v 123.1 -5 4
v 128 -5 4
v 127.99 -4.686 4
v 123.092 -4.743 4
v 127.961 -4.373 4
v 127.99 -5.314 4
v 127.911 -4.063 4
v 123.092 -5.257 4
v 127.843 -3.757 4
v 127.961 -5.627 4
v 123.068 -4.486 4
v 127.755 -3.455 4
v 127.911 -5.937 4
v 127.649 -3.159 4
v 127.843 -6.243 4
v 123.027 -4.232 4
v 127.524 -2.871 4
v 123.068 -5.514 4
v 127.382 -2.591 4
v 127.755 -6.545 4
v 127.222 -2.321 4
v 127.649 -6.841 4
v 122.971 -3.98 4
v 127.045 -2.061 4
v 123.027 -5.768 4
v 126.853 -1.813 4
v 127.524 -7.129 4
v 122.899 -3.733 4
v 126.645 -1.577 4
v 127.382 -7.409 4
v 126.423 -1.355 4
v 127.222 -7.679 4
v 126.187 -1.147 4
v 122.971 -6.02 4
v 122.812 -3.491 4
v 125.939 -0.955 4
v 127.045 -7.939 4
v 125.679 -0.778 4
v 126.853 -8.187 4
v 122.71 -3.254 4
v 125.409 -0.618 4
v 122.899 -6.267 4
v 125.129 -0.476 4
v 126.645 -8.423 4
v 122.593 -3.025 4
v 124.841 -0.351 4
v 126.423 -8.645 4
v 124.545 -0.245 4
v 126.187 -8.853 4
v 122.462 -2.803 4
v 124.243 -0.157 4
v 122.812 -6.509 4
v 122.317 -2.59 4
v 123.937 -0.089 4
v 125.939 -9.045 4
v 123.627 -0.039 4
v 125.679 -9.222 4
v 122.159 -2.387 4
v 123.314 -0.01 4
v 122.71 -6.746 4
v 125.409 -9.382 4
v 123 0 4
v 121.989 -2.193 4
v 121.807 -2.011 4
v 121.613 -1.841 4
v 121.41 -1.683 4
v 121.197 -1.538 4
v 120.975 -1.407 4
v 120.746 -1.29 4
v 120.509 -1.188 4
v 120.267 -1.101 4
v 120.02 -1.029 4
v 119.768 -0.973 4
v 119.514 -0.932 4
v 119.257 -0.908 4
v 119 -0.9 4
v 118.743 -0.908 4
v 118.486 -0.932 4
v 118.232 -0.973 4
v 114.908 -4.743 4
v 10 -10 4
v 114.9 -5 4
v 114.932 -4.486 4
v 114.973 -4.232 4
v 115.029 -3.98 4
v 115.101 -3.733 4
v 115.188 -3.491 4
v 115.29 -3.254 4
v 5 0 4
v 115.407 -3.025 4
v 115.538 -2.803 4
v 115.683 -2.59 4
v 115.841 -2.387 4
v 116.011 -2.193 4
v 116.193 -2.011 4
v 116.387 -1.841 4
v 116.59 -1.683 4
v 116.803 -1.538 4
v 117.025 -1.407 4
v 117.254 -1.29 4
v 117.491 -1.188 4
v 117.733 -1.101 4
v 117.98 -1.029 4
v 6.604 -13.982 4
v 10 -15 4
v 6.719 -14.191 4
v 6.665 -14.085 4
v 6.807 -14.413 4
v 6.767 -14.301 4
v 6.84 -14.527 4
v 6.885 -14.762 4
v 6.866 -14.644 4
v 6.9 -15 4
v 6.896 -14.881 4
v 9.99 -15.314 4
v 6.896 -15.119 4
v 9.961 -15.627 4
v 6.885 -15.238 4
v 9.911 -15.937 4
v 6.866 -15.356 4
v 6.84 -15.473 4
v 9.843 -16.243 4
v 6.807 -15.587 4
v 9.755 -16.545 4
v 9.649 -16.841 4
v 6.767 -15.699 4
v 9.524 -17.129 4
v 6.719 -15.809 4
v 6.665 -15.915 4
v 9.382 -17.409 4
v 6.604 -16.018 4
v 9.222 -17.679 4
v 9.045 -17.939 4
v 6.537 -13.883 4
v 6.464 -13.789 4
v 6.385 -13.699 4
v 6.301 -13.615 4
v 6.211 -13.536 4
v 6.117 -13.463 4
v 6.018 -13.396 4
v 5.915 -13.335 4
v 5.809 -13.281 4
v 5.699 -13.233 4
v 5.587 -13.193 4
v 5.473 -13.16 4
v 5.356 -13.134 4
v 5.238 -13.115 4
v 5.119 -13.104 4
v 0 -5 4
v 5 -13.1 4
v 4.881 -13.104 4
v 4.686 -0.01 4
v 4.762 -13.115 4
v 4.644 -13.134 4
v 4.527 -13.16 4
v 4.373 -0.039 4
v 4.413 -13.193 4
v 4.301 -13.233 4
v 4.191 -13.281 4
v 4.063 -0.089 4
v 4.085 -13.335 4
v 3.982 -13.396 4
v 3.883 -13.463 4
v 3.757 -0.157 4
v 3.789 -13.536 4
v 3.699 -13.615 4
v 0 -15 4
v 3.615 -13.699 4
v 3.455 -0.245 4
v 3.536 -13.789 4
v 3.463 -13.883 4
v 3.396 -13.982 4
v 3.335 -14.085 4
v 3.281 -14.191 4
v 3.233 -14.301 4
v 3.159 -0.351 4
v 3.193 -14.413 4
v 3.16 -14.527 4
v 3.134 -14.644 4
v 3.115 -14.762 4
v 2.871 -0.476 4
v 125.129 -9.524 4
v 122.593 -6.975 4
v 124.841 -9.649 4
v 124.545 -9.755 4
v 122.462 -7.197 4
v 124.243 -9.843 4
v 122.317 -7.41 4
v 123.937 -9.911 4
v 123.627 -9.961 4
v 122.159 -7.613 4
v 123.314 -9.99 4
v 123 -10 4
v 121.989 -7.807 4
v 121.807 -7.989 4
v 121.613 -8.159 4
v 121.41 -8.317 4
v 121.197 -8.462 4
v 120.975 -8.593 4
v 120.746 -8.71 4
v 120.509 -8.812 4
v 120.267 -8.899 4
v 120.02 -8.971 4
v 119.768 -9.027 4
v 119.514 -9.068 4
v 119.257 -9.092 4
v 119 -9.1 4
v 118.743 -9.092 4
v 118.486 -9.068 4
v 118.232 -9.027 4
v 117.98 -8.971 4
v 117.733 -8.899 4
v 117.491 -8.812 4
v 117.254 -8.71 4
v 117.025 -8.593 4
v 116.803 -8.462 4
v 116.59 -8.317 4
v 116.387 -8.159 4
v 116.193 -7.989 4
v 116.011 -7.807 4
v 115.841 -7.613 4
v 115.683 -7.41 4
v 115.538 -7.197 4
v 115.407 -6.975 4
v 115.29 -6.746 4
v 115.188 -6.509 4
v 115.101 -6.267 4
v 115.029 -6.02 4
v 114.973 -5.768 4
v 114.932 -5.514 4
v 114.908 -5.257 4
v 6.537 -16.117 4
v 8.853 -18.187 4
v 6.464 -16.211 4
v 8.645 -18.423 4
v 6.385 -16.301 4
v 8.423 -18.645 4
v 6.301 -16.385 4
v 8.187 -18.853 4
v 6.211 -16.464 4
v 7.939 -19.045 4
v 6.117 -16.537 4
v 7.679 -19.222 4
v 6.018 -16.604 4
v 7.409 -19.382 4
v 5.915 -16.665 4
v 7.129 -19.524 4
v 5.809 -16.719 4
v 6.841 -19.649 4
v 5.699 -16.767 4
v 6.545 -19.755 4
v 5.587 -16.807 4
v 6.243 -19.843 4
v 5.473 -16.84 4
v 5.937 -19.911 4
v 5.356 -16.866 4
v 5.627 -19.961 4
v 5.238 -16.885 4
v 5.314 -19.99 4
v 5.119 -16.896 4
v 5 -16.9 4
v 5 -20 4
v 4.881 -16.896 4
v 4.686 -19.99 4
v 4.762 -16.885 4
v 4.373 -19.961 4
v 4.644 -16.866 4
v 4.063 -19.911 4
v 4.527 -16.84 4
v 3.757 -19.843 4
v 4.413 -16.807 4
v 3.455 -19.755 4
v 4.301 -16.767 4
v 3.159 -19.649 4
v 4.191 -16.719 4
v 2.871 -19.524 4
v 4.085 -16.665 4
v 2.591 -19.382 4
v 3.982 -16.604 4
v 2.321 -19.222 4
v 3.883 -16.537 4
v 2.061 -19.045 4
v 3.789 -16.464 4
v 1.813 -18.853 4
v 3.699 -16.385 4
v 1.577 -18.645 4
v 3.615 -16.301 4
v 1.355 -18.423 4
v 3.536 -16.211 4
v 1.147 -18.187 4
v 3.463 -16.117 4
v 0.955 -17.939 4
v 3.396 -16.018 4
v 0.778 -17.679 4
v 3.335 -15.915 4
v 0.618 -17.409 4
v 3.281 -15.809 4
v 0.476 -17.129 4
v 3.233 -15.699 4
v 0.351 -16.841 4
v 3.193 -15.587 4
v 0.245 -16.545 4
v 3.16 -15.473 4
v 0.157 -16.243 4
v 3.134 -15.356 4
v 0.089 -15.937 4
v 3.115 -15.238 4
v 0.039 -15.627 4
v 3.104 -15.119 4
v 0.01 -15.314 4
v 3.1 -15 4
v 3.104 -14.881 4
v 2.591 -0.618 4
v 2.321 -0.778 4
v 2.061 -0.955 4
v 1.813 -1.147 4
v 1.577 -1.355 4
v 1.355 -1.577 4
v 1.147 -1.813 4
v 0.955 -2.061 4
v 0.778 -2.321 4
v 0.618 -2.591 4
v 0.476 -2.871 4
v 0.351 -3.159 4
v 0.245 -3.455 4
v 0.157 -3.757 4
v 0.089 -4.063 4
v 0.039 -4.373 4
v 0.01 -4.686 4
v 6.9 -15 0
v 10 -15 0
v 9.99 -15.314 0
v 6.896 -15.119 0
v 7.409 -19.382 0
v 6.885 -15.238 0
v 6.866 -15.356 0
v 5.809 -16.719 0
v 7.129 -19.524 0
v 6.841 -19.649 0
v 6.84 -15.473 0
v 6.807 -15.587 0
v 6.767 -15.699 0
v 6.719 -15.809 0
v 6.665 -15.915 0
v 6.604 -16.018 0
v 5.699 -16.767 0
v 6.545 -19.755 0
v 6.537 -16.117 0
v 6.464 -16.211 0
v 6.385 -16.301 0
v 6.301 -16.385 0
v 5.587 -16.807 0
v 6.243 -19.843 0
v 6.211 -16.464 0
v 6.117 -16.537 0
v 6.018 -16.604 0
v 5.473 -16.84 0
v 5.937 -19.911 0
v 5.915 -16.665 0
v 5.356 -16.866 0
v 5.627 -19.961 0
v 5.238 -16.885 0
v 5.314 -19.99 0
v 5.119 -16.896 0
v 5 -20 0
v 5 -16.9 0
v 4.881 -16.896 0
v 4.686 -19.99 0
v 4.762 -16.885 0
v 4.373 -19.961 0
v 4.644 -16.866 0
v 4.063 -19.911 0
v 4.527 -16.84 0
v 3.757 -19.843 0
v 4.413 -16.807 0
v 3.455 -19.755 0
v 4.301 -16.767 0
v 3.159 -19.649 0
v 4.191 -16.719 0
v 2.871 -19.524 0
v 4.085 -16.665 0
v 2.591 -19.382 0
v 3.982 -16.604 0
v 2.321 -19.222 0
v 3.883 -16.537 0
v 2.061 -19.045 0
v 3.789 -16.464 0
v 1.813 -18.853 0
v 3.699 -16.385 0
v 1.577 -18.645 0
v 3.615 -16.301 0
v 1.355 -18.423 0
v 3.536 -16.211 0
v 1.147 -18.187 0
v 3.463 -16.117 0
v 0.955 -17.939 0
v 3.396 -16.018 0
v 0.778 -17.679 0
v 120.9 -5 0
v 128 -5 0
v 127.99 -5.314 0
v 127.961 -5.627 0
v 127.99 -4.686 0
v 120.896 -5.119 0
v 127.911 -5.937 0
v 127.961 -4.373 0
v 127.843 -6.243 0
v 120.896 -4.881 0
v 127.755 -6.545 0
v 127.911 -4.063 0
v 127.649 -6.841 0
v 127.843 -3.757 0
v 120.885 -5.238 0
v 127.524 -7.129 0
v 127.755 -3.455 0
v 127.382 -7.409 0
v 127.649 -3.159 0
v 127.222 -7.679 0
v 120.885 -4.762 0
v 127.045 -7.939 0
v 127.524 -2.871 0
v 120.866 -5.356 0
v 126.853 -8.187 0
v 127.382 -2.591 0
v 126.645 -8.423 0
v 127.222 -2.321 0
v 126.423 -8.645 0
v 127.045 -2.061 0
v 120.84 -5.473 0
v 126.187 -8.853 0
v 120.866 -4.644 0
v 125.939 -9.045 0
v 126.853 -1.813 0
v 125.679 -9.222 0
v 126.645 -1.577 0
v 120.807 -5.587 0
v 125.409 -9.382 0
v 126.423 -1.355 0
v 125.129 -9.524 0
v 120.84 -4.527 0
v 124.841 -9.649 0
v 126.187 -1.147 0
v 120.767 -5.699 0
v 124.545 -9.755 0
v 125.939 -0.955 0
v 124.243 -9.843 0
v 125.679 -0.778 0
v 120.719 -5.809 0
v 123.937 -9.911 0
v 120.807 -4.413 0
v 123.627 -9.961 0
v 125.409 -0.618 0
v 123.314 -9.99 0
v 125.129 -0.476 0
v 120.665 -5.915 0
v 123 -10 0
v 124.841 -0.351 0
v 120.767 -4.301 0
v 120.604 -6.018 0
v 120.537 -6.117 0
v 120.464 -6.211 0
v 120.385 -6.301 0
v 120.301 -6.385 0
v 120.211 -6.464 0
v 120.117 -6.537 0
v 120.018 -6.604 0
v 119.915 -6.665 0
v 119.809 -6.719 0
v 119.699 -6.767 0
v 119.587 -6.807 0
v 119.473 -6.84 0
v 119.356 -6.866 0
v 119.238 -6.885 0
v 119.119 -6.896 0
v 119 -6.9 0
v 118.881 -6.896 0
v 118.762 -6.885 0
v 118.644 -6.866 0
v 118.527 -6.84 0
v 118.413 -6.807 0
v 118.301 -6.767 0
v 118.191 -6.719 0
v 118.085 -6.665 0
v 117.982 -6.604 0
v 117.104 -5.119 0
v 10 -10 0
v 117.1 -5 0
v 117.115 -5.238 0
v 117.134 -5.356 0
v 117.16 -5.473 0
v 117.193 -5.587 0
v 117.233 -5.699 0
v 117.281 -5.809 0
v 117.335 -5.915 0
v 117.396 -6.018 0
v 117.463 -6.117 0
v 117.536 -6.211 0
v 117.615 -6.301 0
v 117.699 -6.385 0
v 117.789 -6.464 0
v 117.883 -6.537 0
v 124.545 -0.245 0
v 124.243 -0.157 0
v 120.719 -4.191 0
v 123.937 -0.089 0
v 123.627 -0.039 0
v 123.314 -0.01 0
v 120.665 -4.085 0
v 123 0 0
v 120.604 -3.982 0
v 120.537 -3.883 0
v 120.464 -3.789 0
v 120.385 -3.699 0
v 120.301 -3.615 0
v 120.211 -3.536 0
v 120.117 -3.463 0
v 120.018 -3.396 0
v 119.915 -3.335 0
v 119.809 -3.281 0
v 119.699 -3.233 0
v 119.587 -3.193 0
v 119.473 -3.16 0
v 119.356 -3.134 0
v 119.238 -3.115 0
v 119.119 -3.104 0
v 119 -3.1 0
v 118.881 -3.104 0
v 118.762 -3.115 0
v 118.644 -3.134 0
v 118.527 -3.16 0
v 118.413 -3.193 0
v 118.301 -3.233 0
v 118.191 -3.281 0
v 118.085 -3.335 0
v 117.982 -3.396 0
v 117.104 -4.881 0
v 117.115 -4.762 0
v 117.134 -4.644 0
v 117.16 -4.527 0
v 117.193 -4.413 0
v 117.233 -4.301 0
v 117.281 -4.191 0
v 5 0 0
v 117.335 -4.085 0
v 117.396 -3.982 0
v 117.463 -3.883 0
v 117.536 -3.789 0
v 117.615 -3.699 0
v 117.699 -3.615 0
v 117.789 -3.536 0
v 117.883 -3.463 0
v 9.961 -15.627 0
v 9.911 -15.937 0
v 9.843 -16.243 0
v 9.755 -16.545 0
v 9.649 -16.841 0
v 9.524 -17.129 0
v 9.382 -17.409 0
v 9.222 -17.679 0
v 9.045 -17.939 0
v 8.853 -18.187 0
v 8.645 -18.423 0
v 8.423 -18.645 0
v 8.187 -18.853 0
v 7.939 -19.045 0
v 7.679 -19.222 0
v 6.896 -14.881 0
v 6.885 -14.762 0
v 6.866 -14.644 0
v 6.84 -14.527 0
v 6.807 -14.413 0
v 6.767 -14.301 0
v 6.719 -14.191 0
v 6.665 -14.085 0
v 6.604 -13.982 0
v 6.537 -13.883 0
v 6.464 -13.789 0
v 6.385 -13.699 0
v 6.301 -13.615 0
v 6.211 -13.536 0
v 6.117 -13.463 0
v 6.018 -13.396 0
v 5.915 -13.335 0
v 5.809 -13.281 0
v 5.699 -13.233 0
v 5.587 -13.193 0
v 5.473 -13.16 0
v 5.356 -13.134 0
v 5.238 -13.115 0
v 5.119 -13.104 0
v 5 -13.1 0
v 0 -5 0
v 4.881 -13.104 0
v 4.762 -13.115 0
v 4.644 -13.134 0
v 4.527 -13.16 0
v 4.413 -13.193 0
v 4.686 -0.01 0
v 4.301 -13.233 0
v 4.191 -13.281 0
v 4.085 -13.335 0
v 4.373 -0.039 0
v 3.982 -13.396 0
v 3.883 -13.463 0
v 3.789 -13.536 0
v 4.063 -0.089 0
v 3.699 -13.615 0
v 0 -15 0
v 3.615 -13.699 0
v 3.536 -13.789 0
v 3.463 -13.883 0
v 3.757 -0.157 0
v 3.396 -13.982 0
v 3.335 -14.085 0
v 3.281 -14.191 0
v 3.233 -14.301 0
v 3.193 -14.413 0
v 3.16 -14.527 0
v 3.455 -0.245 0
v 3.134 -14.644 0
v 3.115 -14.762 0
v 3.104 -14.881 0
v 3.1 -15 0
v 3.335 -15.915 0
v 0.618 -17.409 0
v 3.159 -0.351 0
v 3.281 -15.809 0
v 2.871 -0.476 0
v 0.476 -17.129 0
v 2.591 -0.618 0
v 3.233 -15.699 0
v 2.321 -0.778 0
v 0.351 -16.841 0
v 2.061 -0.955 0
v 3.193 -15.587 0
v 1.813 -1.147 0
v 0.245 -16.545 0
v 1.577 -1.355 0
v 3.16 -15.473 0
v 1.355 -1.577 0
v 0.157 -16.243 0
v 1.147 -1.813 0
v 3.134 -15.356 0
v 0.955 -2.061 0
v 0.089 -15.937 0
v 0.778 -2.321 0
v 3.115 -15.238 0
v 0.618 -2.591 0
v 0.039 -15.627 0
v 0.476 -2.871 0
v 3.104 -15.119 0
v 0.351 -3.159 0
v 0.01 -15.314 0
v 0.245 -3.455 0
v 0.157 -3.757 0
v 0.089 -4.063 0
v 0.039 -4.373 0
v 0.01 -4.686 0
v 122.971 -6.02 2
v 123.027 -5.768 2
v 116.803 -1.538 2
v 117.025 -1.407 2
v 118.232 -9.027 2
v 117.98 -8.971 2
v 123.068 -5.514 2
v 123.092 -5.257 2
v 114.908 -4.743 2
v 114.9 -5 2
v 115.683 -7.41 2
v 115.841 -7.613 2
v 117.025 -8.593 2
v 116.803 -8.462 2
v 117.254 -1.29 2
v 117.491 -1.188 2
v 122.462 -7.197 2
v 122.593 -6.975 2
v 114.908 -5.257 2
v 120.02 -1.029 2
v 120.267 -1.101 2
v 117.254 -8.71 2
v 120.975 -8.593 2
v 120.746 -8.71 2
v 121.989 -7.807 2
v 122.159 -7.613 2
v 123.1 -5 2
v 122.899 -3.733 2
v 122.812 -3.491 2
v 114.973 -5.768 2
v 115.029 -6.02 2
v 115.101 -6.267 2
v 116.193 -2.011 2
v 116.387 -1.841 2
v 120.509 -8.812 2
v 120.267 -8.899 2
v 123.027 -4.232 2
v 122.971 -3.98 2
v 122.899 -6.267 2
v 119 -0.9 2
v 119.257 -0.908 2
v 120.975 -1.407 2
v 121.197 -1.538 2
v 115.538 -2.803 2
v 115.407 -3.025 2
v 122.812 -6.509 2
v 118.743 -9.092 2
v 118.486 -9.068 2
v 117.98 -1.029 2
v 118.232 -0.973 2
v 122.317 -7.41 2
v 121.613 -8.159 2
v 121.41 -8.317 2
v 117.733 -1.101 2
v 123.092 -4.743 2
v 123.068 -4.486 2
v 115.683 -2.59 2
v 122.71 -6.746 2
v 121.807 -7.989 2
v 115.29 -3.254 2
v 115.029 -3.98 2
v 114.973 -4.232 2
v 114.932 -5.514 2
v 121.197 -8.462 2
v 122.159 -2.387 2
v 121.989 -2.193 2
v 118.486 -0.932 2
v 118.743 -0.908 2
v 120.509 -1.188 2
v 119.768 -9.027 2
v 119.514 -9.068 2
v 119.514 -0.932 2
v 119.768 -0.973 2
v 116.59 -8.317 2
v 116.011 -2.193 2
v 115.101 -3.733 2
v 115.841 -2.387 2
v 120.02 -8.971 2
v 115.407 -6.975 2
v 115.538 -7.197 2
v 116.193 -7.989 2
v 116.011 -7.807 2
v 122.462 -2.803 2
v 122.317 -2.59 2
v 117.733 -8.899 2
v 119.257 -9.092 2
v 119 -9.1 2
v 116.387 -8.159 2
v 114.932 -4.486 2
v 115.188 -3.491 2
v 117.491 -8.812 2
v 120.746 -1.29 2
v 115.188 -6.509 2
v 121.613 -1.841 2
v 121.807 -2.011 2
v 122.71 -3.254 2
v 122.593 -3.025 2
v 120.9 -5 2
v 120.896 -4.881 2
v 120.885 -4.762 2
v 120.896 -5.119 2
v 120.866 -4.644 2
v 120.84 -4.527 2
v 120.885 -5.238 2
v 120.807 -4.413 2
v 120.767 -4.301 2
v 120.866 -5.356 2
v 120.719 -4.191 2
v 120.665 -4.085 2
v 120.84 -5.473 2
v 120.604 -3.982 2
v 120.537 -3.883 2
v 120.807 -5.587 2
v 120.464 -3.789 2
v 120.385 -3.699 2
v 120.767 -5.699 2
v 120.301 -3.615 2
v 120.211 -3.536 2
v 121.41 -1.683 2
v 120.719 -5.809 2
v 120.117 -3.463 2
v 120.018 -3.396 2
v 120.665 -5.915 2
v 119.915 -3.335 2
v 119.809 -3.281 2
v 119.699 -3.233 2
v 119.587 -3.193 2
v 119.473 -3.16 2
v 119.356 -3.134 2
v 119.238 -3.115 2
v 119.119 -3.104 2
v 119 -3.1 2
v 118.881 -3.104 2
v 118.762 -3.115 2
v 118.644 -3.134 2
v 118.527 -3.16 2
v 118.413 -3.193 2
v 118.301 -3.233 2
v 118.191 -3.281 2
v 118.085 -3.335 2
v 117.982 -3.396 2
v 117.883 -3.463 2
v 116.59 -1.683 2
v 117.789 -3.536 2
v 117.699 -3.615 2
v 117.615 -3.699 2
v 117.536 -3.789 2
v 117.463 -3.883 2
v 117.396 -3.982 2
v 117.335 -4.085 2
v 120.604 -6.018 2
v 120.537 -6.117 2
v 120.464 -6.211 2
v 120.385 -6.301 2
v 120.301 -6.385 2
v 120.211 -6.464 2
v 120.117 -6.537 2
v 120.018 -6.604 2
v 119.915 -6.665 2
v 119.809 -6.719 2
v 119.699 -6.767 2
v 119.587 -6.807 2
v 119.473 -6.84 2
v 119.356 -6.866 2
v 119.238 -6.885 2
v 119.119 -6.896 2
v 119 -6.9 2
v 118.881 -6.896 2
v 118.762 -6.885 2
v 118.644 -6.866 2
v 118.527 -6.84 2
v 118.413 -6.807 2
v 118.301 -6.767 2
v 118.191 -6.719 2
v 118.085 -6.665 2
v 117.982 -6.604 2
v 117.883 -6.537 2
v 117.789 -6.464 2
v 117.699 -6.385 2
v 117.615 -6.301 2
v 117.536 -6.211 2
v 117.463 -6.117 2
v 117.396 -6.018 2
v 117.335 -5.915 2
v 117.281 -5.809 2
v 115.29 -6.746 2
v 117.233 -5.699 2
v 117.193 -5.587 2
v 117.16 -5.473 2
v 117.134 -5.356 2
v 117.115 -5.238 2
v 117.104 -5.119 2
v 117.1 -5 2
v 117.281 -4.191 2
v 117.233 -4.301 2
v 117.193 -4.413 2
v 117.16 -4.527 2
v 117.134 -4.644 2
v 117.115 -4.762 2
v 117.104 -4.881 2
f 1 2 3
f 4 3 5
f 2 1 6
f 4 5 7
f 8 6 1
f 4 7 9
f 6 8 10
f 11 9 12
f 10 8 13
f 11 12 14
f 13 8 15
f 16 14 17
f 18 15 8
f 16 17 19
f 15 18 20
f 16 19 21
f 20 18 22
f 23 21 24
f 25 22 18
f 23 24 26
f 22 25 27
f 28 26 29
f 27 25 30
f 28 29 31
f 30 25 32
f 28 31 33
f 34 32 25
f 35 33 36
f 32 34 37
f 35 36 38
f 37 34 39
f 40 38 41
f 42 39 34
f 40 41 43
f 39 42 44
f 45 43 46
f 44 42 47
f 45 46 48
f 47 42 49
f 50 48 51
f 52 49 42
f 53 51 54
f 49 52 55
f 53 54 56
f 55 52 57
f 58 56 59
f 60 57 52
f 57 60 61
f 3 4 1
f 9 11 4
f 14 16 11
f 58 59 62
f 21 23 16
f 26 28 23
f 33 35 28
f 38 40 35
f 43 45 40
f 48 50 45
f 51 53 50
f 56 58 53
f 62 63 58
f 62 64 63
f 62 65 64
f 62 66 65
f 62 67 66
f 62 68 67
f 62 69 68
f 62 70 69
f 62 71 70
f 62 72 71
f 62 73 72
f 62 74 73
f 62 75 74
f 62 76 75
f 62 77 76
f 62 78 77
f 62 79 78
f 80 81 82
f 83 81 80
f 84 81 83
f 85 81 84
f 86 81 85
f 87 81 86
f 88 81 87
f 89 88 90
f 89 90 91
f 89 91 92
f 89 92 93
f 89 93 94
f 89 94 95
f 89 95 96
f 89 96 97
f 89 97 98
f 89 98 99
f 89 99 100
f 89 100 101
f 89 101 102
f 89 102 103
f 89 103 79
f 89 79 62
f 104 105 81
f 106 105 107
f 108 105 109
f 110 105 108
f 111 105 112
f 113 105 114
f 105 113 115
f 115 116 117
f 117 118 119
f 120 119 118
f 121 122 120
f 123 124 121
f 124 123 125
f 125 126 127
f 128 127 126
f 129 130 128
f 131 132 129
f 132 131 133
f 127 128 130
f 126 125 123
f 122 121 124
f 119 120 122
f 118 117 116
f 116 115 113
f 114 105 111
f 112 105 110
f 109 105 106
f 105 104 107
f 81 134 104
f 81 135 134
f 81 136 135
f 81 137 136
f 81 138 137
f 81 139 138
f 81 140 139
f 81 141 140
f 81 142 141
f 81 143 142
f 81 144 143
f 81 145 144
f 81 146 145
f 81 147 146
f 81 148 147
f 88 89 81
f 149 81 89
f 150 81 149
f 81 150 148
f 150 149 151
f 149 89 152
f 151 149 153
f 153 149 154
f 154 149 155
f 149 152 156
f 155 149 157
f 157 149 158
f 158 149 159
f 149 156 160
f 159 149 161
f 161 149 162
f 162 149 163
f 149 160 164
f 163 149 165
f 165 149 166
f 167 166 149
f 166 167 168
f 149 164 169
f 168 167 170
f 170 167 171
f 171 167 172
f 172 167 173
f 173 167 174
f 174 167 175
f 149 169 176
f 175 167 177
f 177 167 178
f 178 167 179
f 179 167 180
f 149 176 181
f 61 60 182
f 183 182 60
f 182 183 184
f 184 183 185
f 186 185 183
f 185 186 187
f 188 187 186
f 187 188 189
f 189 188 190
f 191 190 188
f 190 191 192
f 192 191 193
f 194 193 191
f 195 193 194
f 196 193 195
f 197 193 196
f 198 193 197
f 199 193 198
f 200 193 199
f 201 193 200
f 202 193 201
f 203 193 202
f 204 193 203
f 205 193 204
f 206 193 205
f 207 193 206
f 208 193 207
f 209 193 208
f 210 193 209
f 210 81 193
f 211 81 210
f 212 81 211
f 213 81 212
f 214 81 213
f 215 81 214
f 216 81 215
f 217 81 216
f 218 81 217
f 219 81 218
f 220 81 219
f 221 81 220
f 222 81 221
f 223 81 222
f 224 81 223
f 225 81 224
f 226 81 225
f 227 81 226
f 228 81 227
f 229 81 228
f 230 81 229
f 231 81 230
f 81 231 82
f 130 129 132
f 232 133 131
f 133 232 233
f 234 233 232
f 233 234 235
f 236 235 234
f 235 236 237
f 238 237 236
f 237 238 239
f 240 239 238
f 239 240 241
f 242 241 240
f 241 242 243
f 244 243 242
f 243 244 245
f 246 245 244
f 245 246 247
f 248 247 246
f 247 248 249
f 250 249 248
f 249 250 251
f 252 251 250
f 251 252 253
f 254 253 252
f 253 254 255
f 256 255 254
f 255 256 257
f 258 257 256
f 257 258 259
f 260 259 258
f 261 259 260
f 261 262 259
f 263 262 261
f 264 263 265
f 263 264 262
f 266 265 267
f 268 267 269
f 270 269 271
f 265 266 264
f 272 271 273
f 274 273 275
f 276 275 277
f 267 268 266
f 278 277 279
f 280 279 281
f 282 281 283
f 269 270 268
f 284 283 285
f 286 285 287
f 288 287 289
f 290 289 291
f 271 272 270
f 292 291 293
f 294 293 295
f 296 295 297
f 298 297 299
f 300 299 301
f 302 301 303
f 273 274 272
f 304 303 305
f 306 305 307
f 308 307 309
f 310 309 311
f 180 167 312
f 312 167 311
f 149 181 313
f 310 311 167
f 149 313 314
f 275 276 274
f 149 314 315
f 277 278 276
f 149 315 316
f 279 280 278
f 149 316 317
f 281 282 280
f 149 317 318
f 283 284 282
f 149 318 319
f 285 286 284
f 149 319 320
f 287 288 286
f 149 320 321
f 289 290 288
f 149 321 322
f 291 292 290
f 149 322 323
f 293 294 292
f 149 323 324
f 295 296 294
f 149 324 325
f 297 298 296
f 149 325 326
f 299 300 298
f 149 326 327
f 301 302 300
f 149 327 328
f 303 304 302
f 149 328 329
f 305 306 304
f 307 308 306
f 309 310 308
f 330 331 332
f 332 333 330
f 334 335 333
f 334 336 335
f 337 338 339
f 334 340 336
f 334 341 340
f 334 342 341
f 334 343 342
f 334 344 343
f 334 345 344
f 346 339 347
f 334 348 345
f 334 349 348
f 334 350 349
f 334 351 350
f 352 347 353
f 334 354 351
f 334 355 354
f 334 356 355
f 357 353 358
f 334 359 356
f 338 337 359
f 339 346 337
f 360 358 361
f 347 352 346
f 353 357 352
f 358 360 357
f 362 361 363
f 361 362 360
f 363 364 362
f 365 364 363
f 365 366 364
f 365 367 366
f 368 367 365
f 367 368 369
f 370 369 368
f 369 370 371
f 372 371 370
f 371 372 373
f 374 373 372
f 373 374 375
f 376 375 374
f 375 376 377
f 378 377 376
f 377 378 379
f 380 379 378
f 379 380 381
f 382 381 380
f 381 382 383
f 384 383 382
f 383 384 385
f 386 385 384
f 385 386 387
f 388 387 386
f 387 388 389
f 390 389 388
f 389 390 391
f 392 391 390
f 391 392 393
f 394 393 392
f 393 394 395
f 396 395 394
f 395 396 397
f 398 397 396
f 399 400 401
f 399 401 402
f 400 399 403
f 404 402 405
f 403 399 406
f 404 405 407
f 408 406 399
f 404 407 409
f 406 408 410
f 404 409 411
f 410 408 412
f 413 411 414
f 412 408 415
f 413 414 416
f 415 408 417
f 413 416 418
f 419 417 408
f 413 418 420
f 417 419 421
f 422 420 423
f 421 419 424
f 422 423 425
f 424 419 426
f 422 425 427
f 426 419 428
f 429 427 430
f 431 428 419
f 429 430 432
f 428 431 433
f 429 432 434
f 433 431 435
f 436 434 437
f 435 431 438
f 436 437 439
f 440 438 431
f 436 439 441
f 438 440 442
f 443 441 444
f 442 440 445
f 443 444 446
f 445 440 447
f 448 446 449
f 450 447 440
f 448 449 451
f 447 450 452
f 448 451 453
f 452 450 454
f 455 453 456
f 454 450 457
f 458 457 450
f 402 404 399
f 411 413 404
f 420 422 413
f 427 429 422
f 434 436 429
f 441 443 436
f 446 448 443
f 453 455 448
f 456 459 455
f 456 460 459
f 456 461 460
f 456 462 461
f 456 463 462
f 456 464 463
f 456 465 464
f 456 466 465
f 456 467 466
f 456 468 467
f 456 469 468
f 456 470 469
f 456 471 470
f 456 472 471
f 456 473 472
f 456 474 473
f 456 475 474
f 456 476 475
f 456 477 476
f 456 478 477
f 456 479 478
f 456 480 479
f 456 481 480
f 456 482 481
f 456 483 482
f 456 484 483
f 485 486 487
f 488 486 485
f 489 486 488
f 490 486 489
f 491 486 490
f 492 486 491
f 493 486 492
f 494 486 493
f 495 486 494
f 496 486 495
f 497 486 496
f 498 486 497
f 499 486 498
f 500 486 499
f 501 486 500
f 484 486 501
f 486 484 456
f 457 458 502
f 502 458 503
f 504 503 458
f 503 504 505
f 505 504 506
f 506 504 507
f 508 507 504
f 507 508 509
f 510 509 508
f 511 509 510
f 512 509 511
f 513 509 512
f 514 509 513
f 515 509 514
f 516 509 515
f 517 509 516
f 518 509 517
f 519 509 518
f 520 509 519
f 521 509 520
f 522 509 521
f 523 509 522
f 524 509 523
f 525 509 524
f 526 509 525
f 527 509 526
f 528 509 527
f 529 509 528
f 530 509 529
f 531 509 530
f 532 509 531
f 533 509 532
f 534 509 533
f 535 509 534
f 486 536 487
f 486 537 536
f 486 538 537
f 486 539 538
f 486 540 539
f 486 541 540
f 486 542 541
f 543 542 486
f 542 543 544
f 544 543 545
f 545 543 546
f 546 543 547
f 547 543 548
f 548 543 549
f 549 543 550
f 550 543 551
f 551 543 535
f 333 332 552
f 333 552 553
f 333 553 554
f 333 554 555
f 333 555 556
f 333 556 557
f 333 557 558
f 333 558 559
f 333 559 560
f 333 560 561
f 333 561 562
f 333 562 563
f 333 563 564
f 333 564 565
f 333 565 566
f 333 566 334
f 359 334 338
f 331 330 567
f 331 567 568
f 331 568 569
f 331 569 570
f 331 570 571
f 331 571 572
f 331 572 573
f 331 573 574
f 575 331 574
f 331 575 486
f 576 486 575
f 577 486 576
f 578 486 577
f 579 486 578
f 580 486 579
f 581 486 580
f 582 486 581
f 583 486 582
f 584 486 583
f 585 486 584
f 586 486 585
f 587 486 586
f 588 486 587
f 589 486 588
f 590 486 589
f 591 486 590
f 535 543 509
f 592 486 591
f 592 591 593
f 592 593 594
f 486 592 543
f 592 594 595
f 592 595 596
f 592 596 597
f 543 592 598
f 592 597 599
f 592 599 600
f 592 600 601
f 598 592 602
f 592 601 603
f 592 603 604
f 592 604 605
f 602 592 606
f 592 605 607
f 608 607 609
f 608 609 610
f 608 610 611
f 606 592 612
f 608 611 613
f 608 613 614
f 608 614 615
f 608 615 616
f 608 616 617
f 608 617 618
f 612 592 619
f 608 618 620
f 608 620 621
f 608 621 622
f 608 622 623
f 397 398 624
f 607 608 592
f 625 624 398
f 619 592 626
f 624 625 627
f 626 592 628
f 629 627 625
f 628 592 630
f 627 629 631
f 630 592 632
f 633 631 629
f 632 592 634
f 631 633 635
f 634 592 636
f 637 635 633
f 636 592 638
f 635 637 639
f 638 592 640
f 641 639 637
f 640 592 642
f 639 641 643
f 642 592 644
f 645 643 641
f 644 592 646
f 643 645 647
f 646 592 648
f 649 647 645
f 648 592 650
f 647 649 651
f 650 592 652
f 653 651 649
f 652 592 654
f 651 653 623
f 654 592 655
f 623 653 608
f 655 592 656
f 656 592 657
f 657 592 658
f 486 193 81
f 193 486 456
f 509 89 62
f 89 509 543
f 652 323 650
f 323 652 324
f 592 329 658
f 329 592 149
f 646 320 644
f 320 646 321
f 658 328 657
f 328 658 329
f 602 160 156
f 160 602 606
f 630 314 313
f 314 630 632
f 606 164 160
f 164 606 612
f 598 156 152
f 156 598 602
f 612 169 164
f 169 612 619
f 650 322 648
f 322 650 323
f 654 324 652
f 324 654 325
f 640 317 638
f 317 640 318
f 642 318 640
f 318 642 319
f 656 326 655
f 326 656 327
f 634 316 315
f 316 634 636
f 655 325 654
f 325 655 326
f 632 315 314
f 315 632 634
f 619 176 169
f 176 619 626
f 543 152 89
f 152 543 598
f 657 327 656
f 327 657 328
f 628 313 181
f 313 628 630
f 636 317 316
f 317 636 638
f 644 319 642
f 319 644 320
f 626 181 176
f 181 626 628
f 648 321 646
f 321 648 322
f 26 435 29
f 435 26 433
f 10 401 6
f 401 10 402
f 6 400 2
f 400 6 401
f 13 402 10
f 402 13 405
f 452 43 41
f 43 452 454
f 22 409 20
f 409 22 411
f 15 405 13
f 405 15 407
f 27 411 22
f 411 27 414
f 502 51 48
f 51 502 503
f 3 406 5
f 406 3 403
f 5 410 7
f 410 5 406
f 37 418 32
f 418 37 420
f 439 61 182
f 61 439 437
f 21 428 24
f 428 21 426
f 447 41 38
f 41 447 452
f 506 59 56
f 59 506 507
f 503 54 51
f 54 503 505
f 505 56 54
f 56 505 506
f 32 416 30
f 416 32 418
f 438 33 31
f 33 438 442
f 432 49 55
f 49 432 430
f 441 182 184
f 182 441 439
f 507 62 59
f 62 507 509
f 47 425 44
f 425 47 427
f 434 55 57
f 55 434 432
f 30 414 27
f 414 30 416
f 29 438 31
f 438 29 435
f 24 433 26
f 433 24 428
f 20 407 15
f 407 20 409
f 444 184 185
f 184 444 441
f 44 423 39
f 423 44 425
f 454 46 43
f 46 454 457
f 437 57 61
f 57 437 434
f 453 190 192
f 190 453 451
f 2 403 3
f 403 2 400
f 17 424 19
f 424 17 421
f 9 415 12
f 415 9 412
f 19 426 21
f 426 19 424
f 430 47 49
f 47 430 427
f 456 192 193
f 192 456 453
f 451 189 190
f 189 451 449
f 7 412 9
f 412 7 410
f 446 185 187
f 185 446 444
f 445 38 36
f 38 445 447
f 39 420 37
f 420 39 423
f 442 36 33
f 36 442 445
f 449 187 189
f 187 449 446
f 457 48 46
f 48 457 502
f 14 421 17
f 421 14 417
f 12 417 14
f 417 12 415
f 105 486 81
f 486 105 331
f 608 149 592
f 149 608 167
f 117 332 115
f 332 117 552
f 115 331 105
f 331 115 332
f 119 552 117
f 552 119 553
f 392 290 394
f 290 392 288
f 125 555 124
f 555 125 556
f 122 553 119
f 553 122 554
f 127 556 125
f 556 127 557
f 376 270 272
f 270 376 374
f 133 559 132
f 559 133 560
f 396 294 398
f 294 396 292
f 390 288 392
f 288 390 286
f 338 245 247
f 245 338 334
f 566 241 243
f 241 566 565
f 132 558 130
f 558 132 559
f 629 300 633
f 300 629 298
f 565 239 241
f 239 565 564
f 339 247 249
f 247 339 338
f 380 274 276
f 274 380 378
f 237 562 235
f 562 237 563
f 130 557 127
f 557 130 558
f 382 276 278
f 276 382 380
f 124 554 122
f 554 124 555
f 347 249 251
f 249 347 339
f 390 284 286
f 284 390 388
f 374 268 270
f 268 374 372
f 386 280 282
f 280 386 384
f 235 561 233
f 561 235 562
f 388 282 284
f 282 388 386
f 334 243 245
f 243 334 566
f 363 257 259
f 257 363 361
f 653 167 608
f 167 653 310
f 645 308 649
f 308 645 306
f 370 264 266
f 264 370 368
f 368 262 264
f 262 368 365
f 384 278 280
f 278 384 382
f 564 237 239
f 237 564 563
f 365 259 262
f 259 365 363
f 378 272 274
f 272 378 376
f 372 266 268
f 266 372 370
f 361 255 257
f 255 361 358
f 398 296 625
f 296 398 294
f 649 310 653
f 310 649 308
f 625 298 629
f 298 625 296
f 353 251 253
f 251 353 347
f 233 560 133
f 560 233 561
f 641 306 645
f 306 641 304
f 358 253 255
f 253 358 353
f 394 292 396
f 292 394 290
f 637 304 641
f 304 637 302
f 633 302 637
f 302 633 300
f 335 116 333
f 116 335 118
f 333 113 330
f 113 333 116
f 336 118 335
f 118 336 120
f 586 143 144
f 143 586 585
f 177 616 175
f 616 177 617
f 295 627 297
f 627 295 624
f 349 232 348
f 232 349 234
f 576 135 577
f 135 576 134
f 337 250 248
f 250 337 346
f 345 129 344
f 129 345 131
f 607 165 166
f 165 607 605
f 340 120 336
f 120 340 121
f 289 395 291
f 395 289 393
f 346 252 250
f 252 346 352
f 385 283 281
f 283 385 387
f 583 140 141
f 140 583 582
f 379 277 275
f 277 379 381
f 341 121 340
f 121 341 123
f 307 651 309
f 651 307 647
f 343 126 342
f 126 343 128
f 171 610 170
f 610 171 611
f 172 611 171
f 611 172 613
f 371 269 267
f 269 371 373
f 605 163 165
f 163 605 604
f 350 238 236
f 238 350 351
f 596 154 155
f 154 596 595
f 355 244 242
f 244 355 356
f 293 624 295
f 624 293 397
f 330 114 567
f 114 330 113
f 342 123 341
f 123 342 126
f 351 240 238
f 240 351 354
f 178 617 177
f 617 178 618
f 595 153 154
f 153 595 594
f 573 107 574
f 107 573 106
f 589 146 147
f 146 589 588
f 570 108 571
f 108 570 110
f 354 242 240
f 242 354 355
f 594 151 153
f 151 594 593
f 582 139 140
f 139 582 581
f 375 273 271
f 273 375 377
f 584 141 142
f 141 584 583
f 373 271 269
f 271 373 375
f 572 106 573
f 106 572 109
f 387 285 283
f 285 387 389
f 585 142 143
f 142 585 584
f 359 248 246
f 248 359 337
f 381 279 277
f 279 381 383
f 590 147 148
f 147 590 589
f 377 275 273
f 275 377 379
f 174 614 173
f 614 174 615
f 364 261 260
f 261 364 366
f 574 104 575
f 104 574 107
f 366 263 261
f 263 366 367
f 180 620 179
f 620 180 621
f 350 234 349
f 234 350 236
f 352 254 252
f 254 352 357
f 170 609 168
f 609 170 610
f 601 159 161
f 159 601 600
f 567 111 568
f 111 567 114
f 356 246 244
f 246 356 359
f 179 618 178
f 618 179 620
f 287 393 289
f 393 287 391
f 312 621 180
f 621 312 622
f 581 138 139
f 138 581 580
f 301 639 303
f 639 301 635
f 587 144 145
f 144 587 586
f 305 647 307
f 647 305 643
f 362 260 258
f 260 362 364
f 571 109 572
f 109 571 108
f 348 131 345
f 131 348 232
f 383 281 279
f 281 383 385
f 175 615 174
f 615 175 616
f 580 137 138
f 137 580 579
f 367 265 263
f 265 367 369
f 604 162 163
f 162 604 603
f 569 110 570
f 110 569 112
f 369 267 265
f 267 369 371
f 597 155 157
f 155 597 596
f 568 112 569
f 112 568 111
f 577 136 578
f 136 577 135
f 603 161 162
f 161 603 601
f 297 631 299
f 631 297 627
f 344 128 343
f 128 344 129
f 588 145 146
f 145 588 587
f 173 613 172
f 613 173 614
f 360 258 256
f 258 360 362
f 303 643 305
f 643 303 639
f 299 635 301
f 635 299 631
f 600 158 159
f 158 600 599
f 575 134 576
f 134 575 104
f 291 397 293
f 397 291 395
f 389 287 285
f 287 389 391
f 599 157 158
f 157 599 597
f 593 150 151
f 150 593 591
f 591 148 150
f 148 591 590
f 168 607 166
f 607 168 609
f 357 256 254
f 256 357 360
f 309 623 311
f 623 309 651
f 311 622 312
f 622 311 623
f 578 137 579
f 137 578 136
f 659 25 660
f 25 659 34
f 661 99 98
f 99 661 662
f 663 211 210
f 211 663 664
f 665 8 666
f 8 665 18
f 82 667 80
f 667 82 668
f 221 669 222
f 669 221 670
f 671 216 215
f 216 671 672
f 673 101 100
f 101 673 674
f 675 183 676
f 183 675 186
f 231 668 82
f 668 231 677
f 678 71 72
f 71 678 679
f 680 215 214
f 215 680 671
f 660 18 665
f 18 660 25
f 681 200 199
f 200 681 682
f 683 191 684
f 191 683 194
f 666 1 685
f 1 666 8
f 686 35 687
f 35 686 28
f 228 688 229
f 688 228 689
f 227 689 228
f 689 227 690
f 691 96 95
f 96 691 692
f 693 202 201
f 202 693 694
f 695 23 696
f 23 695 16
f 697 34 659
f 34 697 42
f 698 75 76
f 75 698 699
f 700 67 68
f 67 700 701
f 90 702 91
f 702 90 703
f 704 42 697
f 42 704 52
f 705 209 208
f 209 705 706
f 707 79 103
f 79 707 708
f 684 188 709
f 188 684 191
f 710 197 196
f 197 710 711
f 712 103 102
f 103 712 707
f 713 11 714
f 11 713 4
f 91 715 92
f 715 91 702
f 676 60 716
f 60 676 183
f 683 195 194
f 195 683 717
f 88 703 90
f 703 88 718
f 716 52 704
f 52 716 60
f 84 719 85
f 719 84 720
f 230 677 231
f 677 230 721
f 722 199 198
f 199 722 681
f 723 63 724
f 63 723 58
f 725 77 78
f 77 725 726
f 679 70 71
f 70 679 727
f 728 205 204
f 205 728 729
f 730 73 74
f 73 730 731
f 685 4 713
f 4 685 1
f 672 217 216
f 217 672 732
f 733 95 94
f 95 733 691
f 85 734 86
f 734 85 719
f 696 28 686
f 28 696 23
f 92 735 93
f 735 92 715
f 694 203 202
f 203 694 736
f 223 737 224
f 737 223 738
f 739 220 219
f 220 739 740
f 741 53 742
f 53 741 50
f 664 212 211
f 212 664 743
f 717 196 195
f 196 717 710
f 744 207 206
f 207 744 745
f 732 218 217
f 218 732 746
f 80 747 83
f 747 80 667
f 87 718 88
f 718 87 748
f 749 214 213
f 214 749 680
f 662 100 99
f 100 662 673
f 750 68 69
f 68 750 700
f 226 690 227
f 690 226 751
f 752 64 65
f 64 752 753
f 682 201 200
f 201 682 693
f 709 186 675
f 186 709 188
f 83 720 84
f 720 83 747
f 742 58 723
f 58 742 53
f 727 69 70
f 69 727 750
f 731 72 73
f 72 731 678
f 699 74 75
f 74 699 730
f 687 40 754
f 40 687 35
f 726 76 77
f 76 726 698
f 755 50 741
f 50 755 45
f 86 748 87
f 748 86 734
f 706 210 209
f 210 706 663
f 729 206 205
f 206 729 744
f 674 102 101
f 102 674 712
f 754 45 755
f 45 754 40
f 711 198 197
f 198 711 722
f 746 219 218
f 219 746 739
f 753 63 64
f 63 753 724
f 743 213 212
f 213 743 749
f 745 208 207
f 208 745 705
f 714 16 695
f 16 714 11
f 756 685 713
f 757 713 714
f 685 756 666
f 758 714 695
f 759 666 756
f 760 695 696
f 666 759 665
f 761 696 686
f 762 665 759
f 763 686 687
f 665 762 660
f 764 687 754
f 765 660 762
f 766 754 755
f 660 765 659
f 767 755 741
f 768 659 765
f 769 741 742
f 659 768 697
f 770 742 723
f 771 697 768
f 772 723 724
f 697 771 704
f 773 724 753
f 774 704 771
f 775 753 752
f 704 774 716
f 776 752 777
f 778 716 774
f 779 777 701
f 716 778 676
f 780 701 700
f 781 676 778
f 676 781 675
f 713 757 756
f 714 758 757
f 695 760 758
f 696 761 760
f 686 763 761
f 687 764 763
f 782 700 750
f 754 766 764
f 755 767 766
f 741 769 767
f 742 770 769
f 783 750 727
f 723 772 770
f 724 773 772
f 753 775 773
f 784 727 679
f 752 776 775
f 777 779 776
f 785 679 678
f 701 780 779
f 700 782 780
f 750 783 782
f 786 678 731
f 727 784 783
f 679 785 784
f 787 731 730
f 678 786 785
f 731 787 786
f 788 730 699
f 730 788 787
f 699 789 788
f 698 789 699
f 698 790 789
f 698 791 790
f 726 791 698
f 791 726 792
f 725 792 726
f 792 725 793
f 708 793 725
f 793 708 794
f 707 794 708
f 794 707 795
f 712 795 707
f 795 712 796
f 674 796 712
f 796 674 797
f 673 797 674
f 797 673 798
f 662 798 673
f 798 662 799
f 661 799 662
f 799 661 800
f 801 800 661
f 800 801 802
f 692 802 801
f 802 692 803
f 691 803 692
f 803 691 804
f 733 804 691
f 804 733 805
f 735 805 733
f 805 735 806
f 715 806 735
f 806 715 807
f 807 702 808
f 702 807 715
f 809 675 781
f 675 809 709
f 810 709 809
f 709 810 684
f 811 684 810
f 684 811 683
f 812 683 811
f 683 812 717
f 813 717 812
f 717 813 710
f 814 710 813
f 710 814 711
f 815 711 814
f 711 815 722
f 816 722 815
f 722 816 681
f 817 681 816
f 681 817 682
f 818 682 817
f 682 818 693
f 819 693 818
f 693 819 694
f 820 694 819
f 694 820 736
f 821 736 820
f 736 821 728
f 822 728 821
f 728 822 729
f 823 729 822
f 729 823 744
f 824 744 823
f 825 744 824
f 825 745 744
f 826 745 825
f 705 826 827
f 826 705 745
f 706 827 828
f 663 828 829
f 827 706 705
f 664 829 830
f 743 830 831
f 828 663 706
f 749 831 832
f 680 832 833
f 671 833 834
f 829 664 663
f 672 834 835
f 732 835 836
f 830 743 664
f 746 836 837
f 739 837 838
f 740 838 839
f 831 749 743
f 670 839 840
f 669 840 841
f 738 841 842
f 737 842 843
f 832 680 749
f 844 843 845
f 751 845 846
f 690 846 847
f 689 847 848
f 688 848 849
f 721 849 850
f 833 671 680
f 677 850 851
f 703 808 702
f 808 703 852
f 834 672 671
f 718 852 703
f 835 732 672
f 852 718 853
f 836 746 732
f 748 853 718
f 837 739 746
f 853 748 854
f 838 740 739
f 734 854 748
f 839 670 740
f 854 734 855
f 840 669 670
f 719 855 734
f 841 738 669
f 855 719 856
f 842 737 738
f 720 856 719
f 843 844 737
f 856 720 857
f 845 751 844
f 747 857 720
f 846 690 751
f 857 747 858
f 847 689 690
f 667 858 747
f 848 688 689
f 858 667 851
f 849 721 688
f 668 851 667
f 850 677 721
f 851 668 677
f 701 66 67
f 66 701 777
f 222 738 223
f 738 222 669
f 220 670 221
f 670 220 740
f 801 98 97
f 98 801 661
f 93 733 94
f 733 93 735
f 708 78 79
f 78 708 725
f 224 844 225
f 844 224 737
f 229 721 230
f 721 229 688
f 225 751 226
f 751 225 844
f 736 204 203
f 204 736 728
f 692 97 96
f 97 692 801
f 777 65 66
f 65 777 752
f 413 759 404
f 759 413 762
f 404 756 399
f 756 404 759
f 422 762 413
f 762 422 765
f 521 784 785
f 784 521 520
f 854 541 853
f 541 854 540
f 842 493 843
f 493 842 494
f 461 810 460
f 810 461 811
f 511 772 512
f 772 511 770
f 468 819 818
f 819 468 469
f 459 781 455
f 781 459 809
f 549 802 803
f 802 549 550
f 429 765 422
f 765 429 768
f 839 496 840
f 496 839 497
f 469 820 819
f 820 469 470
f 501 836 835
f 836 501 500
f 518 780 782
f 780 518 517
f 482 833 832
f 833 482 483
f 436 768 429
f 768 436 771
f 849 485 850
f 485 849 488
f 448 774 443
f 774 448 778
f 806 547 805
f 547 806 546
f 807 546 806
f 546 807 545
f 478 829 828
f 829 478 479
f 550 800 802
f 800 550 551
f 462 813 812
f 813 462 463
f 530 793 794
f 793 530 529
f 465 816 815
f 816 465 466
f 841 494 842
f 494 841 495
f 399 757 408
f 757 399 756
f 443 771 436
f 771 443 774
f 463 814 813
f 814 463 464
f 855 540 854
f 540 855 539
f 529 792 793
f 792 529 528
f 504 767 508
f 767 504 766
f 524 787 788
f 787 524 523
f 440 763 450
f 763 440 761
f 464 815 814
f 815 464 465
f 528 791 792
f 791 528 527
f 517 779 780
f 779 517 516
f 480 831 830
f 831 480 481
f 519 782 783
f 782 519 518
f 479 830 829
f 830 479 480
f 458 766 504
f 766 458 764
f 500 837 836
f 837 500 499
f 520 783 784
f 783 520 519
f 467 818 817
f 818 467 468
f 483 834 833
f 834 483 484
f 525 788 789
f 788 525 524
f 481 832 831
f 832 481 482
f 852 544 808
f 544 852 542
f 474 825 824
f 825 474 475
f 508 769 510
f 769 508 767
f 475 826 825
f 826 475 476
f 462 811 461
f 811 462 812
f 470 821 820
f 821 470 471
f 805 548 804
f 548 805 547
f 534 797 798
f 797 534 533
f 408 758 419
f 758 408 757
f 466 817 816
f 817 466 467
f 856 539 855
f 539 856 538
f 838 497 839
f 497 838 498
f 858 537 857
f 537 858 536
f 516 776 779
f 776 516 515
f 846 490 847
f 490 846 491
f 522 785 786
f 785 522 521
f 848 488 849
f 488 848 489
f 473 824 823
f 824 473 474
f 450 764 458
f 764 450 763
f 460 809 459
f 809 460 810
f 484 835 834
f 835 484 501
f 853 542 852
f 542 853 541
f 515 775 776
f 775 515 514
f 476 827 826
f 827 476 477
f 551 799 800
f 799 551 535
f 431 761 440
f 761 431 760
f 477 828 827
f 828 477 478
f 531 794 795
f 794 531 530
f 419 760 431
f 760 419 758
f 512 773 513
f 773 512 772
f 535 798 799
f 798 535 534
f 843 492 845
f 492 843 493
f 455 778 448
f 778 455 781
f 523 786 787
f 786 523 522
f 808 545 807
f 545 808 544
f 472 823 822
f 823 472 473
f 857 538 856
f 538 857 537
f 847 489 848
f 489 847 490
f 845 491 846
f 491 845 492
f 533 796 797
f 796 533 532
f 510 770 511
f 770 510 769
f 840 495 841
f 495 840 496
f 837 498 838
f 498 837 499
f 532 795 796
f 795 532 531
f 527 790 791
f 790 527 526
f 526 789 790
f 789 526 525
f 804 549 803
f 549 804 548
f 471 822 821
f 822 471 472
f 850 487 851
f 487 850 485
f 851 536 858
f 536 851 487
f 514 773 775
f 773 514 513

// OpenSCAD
W=15;
W2=10;
D=14;
E=4;
L2=90+D+4;
L1=110+D+4;
$fn=100;

module rcube(x,y,z,d)
{
    union()
    {
        translate([d/2,d/2,0]) cube([x-d,y-d,z]);
        translate([d/2,0,0]) cube([x-d,d,z]);
        translate([d/2,y-d,0]) cube([x-d,d,z]);
        translate([0,d/2,0]) cube([d,y-d,z]);
         translate([x-d,d/2,0]) cube([d,y-d,z]);
        translate([d/2,d/2,0]) cylinder(h=z,d=d);
        translate([x-d/2,d/2,0]) cylinder(h=z,d=d);
         translate([d/2,y-d/2,0]) cylinder(h=z,d=d);
        translate([x-d/2,y-d/2,0]) cylinder(h=z,d=d);
    }
    
}

module petitLevier()
{
    difference()
    {
        union()
        {
        rcube(L2,W,E,10);
            translate([D/2+2+90,W/2,E]) cylinder(h=E+0.5, d=7);
        }
        translate([D/2+2,W/2,E-1]) cylinder(h=2, d=D);
        translate([D/2+2,W/2,-1]) cylinder(h=20, d=3.8);
        translate([D/2+2+18,W/2,-1]) cylinder(h=20, d=3.4);
        translate([D/2+2+24,W/2,-1]) cylinder(h=20, d=3.4);
        translate([D/2+2+30,W/2,-1]) cylinder(h=20, d=3.4);
        
        translate([D/2+2+90,W/2,-1]) cylinder(h=20, d=3.8);
        
    } 
}

module grandLevier()
{
    difference()
    {
        union()
        {
        rcube(L1,W2,E,10);
            //translate([D/2+2+110,W/2,E]) cylinder(h=E+0.5, d=12);
            rcube(10,2*W2,E,10);
        }
        //translate([D/2+2,W/2+W,E-1]) cylinder(h=2, d=D);
        translate([5,W2/2+W2,-1]) cylinder(h=20, d=3.8);
        
        
        translate([D/2+2+110,W2/2,2]) cylinder(h=20, d=8.2);
        translate([D/2+2+110,W2/2,-1]) cylinder(h=20, d=3.8);
        
    } 
}
    
//petitLevier();
mirror([0,1,0]) grandLevier();
